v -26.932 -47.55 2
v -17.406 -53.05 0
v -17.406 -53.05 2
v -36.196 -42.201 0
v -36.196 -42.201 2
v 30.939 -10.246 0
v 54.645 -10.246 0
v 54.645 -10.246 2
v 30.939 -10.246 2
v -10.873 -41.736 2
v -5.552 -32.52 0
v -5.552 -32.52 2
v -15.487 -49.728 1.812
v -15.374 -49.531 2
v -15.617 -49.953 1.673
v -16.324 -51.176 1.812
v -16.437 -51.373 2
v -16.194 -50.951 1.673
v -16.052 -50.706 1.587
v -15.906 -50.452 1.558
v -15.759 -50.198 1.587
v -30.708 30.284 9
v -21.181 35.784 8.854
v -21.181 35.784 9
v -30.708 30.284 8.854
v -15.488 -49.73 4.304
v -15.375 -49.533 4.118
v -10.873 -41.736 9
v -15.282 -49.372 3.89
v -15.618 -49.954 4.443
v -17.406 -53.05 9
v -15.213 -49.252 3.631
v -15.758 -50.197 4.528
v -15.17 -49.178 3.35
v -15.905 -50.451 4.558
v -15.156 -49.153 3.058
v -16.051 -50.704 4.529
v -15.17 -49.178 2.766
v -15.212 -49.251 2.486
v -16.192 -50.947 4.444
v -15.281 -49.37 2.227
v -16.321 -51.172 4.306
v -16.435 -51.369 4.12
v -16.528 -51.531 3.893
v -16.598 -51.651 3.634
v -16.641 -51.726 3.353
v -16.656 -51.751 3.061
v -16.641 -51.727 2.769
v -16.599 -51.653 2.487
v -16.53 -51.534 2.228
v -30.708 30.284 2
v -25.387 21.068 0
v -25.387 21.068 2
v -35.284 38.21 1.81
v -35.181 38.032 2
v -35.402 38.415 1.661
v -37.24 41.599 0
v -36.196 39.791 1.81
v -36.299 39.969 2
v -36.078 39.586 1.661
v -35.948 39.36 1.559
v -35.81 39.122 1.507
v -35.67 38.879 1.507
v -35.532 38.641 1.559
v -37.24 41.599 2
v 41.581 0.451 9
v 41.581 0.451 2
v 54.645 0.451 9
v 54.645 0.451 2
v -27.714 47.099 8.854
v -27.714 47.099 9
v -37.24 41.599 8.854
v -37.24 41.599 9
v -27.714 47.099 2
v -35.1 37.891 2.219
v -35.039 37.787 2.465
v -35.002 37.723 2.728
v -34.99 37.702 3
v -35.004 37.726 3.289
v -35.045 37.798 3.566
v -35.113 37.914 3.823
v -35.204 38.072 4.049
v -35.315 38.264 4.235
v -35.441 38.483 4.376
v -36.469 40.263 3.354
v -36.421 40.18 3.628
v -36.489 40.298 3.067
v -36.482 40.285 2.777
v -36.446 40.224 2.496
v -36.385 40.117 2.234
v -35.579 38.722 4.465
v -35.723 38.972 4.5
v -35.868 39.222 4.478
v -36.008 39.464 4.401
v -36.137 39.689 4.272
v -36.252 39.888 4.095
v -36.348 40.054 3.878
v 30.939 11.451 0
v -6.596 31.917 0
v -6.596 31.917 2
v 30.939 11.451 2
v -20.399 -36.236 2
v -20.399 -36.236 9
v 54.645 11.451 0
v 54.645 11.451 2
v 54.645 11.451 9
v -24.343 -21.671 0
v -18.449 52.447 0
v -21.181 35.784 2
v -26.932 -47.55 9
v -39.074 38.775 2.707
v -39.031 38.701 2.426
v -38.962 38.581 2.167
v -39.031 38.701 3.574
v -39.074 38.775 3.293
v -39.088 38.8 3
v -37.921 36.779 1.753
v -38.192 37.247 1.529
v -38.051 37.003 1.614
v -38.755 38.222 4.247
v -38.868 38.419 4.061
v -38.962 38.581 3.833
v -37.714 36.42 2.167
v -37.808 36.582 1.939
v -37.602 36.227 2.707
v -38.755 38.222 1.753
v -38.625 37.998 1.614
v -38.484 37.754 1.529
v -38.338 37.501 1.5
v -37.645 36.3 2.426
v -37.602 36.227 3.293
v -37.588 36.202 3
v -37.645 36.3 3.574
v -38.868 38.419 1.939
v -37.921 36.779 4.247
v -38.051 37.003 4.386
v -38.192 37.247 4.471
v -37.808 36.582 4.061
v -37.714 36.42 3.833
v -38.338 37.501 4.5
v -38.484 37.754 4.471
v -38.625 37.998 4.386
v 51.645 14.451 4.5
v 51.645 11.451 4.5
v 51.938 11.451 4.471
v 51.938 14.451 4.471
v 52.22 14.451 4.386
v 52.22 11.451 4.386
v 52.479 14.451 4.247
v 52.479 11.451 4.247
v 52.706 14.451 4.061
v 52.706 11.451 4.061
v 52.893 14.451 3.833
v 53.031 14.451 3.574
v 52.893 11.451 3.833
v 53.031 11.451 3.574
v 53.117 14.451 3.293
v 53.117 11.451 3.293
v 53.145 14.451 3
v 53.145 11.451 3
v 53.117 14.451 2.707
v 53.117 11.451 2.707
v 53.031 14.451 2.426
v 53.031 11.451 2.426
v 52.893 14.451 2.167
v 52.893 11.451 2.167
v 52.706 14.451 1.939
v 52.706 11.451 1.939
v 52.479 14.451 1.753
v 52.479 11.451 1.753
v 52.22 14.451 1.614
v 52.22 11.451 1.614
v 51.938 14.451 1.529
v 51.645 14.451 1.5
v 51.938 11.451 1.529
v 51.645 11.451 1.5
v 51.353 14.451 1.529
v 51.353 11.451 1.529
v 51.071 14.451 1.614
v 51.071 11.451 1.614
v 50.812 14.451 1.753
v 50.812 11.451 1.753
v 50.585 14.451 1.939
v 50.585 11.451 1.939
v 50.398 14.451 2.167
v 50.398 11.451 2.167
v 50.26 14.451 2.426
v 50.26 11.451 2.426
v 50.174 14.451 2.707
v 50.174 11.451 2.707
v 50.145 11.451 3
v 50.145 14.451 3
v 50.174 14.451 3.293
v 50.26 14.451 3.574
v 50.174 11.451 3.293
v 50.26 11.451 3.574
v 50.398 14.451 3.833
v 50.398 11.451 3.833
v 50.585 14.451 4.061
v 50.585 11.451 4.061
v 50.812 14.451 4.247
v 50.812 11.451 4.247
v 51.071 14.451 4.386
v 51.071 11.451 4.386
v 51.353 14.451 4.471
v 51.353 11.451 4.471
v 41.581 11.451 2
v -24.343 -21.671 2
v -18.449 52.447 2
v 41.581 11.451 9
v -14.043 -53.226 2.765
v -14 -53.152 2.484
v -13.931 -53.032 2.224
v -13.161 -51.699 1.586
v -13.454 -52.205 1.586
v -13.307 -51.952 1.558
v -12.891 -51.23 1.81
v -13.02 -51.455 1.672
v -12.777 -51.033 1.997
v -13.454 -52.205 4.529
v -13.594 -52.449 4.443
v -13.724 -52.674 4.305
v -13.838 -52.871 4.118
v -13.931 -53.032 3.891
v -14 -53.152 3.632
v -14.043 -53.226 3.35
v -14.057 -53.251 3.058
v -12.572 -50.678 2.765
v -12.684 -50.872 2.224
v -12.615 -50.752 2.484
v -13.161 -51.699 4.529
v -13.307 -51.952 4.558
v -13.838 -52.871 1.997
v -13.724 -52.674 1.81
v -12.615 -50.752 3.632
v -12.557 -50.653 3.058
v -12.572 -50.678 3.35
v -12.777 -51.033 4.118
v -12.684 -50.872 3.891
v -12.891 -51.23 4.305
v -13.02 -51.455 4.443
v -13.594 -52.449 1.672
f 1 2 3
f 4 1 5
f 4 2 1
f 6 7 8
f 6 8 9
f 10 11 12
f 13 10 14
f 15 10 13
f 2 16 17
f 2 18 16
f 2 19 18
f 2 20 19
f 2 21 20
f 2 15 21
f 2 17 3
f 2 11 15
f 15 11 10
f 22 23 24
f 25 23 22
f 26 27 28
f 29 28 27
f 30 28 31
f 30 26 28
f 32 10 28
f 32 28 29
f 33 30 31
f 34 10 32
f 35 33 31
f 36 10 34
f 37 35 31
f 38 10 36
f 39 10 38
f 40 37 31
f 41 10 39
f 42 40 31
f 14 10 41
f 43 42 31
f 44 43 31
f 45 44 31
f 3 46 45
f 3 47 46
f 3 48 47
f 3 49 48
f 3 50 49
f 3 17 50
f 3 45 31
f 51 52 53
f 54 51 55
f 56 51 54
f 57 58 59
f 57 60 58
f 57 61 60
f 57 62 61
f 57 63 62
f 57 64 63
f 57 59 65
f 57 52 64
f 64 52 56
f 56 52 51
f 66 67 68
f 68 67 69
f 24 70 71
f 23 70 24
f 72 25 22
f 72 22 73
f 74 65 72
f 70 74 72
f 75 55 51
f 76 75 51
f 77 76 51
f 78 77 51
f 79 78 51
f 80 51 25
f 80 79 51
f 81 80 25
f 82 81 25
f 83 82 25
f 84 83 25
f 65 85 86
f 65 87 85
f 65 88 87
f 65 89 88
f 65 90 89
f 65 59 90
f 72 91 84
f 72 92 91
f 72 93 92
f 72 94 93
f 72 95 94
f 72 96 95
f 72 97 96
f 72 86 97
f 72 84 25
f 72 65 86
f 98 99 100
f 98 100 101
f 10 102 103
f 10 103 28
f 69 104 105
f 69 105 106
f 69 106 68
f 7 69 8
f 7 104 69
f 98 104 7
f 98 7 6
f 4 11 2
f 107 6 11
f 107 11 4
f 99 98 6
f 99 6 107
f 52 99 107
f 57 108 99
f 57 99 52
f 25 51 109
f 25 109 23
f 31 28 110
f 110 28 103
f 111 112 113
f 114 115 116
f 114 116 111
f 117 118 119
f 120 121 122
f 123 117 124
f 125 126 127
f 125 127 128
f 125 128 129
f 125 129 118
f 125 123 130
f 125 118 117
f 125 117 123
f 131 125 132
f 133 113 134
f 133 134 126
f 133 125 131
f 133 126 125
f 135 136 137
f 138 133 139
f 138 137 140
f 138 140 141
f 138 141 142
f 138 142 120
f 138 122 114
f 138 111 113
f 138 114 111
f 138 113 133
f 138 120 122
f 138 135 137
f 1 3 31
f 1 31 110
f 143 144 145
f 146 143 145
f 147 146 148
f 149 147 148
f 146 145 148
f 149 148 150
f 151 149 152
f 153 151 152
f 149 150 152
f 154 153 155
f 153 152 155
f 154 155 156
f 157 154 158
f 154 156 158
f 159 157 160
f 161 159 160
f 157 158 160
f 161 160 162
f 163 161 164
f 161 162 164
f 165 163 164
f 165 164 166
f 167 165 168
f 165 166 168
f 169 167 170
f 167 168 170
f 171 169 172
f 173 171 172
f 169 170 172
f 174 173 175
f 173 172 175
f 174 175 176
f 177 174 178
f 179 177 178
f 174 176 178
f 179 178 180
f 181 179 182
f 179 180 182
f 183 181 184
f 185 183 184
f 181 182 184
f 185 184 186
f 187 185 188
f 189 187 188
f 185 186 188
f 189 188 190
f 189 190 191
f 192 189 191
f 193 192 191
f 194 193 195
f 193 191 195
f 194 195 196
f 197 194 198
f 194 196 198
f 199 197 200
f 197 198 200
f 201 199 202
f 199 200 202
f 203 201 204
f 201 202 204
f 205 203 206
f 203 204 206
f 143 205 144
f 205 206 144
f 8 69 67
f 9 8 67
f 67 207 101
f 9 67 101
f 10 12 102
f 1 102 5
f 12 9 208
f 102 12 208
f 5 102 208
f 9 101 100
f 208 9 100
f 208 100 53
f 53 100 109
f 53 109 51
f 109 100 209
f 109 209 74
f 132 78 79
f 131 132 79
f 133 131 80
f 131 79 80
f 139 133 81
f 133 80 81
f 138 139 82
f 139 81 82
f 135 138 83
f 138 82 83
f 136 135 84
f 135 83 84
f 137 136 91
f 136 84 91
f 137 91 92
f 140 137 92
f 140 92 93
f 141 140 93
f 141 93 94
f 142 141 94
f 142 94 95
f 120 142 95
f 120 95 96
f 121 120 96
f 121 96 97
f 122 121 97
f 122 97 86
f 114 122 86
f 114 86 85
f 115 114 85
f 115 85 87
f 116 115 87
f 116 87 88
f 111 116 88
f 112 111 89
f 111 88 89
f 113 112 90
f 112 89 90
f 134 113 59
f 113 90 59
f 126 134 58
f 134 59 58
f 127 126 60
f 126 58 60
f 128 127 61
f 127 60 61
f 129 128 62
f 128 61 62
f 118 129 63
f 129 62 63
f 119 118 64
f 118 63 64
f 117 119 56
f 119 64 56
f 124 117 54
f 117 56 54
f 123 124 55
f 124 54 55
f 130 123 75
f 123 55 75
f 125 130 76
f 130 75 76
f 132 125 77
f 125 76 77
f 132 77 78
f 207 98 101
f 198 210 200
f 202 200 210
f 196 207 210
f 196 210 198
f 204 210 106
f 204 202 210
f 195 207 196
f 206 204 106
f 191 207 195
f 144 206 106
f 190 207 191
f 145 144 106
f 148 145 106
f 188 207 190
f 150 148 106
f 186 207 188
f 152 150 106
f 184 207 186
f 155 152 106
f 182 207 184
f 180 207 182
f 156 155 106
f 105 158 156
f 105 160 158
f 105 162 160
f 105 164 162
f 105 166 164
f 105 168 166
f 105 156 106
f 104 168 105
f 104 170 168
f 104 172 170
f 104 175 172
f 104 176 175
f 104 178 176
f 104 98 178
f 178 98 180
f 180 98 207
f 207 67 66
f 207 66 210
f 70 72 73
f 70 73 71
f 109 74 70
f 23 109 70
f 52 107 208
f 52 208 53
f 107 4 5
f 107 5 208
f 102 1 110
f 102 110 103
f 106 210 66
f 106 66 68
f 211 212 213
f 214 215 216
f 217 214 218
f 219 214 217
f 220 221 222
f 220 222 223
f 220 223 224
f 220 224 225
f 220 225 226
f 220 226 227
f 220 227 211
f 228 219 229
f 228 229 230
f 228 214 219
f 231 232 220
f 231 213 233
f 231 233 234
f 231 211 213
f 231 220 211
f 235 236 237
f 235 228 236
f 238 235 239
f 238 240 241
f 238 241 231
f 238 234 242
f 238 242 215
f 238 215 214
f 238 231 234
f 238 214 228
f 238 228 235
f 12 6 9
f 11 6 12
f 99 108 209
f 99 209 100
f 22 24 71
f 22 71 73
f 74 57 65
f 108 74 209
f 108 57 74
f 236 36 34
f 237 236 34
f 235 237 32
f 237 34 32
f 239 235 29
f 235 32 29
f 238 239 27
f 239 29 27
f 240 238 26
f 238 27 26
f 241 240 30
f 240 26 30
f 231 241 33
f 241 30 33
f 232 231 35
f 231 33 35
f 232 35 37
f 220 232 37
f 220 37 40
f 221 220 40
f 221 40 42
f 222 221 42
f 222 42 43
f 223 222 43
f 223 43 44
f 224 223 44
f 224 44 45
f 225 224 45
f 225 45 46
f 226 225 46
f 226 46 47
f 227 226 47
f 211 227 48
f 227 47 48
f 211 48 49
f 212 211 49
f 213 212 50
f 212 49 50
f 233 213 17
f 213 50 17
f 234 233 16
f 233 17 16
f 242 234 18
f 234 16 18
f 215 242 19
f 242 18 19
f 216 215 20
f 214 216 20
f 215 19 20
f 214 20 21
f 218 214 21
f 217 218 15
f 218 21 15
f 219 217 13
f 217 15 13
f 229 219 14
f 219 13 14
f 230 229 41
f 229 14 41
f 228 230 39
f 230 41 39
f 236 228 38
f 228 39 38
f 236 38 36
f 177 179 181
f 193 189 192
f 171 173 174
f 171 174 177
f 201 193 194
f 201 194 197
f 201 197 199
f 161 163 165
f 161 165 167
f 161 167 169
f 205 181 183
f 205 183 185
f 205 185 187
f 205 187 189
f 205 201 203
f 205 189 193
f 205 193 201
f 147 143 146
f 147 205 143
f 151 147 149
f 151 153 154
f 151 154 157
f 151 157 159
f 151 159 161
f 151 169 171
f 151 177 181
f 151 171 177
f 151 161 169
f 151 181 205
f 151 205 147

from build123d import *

# Parameters (mm, degrees)
BOSS_EXTRUDE1_DEPTH = 2
SKETCH2_W           = 6.854235104
SKETCH2_H           = 13.064732657
BOSS_EXTRUDE2_DEPTH = 11
SKETCH3_W           = 13.064732657
SKETCH3_H           = 11
BOSS_EXTRUDE3_DEPTH = 7
SKETCH6_R           = 1.5
BOSS_EXTRUDE4_DEPTH = 3
SKETCH7_R           = 1.5
BOSS_EXTRUDE5_DEPTH = 3
SKETCH8_R           = 1.5
BOSS_EXTRUDE6_DEPTH = 3


with BuildPart() as part:
    # Sketch1 → Boss-Extrude1 (new body)
    with BuildSketch(Plane.XY):
        Polygon((30.93899215, 11.451445147), (54.645492629, 11.451445147), (54.645492629, -10.246029868), (30.93899215, -10.246029868), (-5.552253668, -32.519675743), (-17.405503908, -53.050107393), (-36.196068468, -42.201369885), (-24.342818229, -21.670938236), (-25.386738482, 21.068230596), (-37.239988722, 41.598662246), (-18.449424161, 52.447399753), (-6.596173922, 31.916968104), align=None)
    extrude(amount=BOSS_EXTRUDE1_DEPTH)

    # Sketch2 → Boss-Extrude2 (add)
    with BuildSketch(Plane(origin=(-9.917242407, -5.725722573, 0), x_dir=(0, 0, 1), z_dir=(-0.8660254037844431, -0.4999999999999922, 0))):
        with Locations((5.427117552, 48.1131263)):
            Rectangle(SKETCH2_W, SKETCH2_H)
    extrude(amount=-BOSS_EXTRUDE2_DEPTH)

    # Sketch3 → Boss-Extrude3 (add)
    with BuildSketch(Plane.XY.offset(2)):
        Polygon((-37.239988722, 41.598662246), (-27.71370928, 47.098662246), (-21.181342951, 35.784271871), (-30.707622393, 30.284271871), align=None)
        with Locations((48.1131263, 5.951445147)):
            Rectangle(SKETCH3_W, SKETCH3_H)
        Polygon((-10.873137579, -41.735717017), (-17.405503908, -53.050107393), (-26.931783349, -47.550107393), (-20.39941702, -36.235717017), align=None)
    extrude(amount=BOSS_EXTRUDE3_DEPTH)

    # Sketch6 → Boss-Extrude4 (add)
    with BuildSketch(Plane(origin=(-9.917242407, -5.725722573, 0), x_dir=(0, 0, 1), z_dir=(-0.8660254037844431, -0.4999999999999922, 0))):
        with Locations(Location((3, 51.645492629, 0), (0, 0, 270))):
            Circle(SKETCH6_R)
    extrude(amount=BOSS_EXTRUDE4_DEPTH)

    # Sketch7 → Boss-Extrude5 (add)
    with BuildSketch(Plane(origin=(9.917242407, -5.725722573, 0), x_dir=(0, 0, -1), z_dir=(0.8660254037844364, -0.5000000000000041, 0))):
        with Locations(Location((-3.057556163, -51.645492629, 0), (0, 0, 90))):
            Circle(SKETCH7_R)
    extrude(amount=BOSS_EXTRUDE5_DEPTH)

    # Sketch8 → Boss-Extrude6 (add)
    with BuildSketch(Plane(origin=(0, 11.451445147, 0), x_dir=(1, 0, 0), z_dir=(0, 1, 0))):
        with Locations(Location((51.645492629, -3, 0), (0, 0, 270))):
            Circle(SKETCH8_R)
    extrude(amount=BOSS_EXTRUDE6_DEPTH)


solid = part.part
